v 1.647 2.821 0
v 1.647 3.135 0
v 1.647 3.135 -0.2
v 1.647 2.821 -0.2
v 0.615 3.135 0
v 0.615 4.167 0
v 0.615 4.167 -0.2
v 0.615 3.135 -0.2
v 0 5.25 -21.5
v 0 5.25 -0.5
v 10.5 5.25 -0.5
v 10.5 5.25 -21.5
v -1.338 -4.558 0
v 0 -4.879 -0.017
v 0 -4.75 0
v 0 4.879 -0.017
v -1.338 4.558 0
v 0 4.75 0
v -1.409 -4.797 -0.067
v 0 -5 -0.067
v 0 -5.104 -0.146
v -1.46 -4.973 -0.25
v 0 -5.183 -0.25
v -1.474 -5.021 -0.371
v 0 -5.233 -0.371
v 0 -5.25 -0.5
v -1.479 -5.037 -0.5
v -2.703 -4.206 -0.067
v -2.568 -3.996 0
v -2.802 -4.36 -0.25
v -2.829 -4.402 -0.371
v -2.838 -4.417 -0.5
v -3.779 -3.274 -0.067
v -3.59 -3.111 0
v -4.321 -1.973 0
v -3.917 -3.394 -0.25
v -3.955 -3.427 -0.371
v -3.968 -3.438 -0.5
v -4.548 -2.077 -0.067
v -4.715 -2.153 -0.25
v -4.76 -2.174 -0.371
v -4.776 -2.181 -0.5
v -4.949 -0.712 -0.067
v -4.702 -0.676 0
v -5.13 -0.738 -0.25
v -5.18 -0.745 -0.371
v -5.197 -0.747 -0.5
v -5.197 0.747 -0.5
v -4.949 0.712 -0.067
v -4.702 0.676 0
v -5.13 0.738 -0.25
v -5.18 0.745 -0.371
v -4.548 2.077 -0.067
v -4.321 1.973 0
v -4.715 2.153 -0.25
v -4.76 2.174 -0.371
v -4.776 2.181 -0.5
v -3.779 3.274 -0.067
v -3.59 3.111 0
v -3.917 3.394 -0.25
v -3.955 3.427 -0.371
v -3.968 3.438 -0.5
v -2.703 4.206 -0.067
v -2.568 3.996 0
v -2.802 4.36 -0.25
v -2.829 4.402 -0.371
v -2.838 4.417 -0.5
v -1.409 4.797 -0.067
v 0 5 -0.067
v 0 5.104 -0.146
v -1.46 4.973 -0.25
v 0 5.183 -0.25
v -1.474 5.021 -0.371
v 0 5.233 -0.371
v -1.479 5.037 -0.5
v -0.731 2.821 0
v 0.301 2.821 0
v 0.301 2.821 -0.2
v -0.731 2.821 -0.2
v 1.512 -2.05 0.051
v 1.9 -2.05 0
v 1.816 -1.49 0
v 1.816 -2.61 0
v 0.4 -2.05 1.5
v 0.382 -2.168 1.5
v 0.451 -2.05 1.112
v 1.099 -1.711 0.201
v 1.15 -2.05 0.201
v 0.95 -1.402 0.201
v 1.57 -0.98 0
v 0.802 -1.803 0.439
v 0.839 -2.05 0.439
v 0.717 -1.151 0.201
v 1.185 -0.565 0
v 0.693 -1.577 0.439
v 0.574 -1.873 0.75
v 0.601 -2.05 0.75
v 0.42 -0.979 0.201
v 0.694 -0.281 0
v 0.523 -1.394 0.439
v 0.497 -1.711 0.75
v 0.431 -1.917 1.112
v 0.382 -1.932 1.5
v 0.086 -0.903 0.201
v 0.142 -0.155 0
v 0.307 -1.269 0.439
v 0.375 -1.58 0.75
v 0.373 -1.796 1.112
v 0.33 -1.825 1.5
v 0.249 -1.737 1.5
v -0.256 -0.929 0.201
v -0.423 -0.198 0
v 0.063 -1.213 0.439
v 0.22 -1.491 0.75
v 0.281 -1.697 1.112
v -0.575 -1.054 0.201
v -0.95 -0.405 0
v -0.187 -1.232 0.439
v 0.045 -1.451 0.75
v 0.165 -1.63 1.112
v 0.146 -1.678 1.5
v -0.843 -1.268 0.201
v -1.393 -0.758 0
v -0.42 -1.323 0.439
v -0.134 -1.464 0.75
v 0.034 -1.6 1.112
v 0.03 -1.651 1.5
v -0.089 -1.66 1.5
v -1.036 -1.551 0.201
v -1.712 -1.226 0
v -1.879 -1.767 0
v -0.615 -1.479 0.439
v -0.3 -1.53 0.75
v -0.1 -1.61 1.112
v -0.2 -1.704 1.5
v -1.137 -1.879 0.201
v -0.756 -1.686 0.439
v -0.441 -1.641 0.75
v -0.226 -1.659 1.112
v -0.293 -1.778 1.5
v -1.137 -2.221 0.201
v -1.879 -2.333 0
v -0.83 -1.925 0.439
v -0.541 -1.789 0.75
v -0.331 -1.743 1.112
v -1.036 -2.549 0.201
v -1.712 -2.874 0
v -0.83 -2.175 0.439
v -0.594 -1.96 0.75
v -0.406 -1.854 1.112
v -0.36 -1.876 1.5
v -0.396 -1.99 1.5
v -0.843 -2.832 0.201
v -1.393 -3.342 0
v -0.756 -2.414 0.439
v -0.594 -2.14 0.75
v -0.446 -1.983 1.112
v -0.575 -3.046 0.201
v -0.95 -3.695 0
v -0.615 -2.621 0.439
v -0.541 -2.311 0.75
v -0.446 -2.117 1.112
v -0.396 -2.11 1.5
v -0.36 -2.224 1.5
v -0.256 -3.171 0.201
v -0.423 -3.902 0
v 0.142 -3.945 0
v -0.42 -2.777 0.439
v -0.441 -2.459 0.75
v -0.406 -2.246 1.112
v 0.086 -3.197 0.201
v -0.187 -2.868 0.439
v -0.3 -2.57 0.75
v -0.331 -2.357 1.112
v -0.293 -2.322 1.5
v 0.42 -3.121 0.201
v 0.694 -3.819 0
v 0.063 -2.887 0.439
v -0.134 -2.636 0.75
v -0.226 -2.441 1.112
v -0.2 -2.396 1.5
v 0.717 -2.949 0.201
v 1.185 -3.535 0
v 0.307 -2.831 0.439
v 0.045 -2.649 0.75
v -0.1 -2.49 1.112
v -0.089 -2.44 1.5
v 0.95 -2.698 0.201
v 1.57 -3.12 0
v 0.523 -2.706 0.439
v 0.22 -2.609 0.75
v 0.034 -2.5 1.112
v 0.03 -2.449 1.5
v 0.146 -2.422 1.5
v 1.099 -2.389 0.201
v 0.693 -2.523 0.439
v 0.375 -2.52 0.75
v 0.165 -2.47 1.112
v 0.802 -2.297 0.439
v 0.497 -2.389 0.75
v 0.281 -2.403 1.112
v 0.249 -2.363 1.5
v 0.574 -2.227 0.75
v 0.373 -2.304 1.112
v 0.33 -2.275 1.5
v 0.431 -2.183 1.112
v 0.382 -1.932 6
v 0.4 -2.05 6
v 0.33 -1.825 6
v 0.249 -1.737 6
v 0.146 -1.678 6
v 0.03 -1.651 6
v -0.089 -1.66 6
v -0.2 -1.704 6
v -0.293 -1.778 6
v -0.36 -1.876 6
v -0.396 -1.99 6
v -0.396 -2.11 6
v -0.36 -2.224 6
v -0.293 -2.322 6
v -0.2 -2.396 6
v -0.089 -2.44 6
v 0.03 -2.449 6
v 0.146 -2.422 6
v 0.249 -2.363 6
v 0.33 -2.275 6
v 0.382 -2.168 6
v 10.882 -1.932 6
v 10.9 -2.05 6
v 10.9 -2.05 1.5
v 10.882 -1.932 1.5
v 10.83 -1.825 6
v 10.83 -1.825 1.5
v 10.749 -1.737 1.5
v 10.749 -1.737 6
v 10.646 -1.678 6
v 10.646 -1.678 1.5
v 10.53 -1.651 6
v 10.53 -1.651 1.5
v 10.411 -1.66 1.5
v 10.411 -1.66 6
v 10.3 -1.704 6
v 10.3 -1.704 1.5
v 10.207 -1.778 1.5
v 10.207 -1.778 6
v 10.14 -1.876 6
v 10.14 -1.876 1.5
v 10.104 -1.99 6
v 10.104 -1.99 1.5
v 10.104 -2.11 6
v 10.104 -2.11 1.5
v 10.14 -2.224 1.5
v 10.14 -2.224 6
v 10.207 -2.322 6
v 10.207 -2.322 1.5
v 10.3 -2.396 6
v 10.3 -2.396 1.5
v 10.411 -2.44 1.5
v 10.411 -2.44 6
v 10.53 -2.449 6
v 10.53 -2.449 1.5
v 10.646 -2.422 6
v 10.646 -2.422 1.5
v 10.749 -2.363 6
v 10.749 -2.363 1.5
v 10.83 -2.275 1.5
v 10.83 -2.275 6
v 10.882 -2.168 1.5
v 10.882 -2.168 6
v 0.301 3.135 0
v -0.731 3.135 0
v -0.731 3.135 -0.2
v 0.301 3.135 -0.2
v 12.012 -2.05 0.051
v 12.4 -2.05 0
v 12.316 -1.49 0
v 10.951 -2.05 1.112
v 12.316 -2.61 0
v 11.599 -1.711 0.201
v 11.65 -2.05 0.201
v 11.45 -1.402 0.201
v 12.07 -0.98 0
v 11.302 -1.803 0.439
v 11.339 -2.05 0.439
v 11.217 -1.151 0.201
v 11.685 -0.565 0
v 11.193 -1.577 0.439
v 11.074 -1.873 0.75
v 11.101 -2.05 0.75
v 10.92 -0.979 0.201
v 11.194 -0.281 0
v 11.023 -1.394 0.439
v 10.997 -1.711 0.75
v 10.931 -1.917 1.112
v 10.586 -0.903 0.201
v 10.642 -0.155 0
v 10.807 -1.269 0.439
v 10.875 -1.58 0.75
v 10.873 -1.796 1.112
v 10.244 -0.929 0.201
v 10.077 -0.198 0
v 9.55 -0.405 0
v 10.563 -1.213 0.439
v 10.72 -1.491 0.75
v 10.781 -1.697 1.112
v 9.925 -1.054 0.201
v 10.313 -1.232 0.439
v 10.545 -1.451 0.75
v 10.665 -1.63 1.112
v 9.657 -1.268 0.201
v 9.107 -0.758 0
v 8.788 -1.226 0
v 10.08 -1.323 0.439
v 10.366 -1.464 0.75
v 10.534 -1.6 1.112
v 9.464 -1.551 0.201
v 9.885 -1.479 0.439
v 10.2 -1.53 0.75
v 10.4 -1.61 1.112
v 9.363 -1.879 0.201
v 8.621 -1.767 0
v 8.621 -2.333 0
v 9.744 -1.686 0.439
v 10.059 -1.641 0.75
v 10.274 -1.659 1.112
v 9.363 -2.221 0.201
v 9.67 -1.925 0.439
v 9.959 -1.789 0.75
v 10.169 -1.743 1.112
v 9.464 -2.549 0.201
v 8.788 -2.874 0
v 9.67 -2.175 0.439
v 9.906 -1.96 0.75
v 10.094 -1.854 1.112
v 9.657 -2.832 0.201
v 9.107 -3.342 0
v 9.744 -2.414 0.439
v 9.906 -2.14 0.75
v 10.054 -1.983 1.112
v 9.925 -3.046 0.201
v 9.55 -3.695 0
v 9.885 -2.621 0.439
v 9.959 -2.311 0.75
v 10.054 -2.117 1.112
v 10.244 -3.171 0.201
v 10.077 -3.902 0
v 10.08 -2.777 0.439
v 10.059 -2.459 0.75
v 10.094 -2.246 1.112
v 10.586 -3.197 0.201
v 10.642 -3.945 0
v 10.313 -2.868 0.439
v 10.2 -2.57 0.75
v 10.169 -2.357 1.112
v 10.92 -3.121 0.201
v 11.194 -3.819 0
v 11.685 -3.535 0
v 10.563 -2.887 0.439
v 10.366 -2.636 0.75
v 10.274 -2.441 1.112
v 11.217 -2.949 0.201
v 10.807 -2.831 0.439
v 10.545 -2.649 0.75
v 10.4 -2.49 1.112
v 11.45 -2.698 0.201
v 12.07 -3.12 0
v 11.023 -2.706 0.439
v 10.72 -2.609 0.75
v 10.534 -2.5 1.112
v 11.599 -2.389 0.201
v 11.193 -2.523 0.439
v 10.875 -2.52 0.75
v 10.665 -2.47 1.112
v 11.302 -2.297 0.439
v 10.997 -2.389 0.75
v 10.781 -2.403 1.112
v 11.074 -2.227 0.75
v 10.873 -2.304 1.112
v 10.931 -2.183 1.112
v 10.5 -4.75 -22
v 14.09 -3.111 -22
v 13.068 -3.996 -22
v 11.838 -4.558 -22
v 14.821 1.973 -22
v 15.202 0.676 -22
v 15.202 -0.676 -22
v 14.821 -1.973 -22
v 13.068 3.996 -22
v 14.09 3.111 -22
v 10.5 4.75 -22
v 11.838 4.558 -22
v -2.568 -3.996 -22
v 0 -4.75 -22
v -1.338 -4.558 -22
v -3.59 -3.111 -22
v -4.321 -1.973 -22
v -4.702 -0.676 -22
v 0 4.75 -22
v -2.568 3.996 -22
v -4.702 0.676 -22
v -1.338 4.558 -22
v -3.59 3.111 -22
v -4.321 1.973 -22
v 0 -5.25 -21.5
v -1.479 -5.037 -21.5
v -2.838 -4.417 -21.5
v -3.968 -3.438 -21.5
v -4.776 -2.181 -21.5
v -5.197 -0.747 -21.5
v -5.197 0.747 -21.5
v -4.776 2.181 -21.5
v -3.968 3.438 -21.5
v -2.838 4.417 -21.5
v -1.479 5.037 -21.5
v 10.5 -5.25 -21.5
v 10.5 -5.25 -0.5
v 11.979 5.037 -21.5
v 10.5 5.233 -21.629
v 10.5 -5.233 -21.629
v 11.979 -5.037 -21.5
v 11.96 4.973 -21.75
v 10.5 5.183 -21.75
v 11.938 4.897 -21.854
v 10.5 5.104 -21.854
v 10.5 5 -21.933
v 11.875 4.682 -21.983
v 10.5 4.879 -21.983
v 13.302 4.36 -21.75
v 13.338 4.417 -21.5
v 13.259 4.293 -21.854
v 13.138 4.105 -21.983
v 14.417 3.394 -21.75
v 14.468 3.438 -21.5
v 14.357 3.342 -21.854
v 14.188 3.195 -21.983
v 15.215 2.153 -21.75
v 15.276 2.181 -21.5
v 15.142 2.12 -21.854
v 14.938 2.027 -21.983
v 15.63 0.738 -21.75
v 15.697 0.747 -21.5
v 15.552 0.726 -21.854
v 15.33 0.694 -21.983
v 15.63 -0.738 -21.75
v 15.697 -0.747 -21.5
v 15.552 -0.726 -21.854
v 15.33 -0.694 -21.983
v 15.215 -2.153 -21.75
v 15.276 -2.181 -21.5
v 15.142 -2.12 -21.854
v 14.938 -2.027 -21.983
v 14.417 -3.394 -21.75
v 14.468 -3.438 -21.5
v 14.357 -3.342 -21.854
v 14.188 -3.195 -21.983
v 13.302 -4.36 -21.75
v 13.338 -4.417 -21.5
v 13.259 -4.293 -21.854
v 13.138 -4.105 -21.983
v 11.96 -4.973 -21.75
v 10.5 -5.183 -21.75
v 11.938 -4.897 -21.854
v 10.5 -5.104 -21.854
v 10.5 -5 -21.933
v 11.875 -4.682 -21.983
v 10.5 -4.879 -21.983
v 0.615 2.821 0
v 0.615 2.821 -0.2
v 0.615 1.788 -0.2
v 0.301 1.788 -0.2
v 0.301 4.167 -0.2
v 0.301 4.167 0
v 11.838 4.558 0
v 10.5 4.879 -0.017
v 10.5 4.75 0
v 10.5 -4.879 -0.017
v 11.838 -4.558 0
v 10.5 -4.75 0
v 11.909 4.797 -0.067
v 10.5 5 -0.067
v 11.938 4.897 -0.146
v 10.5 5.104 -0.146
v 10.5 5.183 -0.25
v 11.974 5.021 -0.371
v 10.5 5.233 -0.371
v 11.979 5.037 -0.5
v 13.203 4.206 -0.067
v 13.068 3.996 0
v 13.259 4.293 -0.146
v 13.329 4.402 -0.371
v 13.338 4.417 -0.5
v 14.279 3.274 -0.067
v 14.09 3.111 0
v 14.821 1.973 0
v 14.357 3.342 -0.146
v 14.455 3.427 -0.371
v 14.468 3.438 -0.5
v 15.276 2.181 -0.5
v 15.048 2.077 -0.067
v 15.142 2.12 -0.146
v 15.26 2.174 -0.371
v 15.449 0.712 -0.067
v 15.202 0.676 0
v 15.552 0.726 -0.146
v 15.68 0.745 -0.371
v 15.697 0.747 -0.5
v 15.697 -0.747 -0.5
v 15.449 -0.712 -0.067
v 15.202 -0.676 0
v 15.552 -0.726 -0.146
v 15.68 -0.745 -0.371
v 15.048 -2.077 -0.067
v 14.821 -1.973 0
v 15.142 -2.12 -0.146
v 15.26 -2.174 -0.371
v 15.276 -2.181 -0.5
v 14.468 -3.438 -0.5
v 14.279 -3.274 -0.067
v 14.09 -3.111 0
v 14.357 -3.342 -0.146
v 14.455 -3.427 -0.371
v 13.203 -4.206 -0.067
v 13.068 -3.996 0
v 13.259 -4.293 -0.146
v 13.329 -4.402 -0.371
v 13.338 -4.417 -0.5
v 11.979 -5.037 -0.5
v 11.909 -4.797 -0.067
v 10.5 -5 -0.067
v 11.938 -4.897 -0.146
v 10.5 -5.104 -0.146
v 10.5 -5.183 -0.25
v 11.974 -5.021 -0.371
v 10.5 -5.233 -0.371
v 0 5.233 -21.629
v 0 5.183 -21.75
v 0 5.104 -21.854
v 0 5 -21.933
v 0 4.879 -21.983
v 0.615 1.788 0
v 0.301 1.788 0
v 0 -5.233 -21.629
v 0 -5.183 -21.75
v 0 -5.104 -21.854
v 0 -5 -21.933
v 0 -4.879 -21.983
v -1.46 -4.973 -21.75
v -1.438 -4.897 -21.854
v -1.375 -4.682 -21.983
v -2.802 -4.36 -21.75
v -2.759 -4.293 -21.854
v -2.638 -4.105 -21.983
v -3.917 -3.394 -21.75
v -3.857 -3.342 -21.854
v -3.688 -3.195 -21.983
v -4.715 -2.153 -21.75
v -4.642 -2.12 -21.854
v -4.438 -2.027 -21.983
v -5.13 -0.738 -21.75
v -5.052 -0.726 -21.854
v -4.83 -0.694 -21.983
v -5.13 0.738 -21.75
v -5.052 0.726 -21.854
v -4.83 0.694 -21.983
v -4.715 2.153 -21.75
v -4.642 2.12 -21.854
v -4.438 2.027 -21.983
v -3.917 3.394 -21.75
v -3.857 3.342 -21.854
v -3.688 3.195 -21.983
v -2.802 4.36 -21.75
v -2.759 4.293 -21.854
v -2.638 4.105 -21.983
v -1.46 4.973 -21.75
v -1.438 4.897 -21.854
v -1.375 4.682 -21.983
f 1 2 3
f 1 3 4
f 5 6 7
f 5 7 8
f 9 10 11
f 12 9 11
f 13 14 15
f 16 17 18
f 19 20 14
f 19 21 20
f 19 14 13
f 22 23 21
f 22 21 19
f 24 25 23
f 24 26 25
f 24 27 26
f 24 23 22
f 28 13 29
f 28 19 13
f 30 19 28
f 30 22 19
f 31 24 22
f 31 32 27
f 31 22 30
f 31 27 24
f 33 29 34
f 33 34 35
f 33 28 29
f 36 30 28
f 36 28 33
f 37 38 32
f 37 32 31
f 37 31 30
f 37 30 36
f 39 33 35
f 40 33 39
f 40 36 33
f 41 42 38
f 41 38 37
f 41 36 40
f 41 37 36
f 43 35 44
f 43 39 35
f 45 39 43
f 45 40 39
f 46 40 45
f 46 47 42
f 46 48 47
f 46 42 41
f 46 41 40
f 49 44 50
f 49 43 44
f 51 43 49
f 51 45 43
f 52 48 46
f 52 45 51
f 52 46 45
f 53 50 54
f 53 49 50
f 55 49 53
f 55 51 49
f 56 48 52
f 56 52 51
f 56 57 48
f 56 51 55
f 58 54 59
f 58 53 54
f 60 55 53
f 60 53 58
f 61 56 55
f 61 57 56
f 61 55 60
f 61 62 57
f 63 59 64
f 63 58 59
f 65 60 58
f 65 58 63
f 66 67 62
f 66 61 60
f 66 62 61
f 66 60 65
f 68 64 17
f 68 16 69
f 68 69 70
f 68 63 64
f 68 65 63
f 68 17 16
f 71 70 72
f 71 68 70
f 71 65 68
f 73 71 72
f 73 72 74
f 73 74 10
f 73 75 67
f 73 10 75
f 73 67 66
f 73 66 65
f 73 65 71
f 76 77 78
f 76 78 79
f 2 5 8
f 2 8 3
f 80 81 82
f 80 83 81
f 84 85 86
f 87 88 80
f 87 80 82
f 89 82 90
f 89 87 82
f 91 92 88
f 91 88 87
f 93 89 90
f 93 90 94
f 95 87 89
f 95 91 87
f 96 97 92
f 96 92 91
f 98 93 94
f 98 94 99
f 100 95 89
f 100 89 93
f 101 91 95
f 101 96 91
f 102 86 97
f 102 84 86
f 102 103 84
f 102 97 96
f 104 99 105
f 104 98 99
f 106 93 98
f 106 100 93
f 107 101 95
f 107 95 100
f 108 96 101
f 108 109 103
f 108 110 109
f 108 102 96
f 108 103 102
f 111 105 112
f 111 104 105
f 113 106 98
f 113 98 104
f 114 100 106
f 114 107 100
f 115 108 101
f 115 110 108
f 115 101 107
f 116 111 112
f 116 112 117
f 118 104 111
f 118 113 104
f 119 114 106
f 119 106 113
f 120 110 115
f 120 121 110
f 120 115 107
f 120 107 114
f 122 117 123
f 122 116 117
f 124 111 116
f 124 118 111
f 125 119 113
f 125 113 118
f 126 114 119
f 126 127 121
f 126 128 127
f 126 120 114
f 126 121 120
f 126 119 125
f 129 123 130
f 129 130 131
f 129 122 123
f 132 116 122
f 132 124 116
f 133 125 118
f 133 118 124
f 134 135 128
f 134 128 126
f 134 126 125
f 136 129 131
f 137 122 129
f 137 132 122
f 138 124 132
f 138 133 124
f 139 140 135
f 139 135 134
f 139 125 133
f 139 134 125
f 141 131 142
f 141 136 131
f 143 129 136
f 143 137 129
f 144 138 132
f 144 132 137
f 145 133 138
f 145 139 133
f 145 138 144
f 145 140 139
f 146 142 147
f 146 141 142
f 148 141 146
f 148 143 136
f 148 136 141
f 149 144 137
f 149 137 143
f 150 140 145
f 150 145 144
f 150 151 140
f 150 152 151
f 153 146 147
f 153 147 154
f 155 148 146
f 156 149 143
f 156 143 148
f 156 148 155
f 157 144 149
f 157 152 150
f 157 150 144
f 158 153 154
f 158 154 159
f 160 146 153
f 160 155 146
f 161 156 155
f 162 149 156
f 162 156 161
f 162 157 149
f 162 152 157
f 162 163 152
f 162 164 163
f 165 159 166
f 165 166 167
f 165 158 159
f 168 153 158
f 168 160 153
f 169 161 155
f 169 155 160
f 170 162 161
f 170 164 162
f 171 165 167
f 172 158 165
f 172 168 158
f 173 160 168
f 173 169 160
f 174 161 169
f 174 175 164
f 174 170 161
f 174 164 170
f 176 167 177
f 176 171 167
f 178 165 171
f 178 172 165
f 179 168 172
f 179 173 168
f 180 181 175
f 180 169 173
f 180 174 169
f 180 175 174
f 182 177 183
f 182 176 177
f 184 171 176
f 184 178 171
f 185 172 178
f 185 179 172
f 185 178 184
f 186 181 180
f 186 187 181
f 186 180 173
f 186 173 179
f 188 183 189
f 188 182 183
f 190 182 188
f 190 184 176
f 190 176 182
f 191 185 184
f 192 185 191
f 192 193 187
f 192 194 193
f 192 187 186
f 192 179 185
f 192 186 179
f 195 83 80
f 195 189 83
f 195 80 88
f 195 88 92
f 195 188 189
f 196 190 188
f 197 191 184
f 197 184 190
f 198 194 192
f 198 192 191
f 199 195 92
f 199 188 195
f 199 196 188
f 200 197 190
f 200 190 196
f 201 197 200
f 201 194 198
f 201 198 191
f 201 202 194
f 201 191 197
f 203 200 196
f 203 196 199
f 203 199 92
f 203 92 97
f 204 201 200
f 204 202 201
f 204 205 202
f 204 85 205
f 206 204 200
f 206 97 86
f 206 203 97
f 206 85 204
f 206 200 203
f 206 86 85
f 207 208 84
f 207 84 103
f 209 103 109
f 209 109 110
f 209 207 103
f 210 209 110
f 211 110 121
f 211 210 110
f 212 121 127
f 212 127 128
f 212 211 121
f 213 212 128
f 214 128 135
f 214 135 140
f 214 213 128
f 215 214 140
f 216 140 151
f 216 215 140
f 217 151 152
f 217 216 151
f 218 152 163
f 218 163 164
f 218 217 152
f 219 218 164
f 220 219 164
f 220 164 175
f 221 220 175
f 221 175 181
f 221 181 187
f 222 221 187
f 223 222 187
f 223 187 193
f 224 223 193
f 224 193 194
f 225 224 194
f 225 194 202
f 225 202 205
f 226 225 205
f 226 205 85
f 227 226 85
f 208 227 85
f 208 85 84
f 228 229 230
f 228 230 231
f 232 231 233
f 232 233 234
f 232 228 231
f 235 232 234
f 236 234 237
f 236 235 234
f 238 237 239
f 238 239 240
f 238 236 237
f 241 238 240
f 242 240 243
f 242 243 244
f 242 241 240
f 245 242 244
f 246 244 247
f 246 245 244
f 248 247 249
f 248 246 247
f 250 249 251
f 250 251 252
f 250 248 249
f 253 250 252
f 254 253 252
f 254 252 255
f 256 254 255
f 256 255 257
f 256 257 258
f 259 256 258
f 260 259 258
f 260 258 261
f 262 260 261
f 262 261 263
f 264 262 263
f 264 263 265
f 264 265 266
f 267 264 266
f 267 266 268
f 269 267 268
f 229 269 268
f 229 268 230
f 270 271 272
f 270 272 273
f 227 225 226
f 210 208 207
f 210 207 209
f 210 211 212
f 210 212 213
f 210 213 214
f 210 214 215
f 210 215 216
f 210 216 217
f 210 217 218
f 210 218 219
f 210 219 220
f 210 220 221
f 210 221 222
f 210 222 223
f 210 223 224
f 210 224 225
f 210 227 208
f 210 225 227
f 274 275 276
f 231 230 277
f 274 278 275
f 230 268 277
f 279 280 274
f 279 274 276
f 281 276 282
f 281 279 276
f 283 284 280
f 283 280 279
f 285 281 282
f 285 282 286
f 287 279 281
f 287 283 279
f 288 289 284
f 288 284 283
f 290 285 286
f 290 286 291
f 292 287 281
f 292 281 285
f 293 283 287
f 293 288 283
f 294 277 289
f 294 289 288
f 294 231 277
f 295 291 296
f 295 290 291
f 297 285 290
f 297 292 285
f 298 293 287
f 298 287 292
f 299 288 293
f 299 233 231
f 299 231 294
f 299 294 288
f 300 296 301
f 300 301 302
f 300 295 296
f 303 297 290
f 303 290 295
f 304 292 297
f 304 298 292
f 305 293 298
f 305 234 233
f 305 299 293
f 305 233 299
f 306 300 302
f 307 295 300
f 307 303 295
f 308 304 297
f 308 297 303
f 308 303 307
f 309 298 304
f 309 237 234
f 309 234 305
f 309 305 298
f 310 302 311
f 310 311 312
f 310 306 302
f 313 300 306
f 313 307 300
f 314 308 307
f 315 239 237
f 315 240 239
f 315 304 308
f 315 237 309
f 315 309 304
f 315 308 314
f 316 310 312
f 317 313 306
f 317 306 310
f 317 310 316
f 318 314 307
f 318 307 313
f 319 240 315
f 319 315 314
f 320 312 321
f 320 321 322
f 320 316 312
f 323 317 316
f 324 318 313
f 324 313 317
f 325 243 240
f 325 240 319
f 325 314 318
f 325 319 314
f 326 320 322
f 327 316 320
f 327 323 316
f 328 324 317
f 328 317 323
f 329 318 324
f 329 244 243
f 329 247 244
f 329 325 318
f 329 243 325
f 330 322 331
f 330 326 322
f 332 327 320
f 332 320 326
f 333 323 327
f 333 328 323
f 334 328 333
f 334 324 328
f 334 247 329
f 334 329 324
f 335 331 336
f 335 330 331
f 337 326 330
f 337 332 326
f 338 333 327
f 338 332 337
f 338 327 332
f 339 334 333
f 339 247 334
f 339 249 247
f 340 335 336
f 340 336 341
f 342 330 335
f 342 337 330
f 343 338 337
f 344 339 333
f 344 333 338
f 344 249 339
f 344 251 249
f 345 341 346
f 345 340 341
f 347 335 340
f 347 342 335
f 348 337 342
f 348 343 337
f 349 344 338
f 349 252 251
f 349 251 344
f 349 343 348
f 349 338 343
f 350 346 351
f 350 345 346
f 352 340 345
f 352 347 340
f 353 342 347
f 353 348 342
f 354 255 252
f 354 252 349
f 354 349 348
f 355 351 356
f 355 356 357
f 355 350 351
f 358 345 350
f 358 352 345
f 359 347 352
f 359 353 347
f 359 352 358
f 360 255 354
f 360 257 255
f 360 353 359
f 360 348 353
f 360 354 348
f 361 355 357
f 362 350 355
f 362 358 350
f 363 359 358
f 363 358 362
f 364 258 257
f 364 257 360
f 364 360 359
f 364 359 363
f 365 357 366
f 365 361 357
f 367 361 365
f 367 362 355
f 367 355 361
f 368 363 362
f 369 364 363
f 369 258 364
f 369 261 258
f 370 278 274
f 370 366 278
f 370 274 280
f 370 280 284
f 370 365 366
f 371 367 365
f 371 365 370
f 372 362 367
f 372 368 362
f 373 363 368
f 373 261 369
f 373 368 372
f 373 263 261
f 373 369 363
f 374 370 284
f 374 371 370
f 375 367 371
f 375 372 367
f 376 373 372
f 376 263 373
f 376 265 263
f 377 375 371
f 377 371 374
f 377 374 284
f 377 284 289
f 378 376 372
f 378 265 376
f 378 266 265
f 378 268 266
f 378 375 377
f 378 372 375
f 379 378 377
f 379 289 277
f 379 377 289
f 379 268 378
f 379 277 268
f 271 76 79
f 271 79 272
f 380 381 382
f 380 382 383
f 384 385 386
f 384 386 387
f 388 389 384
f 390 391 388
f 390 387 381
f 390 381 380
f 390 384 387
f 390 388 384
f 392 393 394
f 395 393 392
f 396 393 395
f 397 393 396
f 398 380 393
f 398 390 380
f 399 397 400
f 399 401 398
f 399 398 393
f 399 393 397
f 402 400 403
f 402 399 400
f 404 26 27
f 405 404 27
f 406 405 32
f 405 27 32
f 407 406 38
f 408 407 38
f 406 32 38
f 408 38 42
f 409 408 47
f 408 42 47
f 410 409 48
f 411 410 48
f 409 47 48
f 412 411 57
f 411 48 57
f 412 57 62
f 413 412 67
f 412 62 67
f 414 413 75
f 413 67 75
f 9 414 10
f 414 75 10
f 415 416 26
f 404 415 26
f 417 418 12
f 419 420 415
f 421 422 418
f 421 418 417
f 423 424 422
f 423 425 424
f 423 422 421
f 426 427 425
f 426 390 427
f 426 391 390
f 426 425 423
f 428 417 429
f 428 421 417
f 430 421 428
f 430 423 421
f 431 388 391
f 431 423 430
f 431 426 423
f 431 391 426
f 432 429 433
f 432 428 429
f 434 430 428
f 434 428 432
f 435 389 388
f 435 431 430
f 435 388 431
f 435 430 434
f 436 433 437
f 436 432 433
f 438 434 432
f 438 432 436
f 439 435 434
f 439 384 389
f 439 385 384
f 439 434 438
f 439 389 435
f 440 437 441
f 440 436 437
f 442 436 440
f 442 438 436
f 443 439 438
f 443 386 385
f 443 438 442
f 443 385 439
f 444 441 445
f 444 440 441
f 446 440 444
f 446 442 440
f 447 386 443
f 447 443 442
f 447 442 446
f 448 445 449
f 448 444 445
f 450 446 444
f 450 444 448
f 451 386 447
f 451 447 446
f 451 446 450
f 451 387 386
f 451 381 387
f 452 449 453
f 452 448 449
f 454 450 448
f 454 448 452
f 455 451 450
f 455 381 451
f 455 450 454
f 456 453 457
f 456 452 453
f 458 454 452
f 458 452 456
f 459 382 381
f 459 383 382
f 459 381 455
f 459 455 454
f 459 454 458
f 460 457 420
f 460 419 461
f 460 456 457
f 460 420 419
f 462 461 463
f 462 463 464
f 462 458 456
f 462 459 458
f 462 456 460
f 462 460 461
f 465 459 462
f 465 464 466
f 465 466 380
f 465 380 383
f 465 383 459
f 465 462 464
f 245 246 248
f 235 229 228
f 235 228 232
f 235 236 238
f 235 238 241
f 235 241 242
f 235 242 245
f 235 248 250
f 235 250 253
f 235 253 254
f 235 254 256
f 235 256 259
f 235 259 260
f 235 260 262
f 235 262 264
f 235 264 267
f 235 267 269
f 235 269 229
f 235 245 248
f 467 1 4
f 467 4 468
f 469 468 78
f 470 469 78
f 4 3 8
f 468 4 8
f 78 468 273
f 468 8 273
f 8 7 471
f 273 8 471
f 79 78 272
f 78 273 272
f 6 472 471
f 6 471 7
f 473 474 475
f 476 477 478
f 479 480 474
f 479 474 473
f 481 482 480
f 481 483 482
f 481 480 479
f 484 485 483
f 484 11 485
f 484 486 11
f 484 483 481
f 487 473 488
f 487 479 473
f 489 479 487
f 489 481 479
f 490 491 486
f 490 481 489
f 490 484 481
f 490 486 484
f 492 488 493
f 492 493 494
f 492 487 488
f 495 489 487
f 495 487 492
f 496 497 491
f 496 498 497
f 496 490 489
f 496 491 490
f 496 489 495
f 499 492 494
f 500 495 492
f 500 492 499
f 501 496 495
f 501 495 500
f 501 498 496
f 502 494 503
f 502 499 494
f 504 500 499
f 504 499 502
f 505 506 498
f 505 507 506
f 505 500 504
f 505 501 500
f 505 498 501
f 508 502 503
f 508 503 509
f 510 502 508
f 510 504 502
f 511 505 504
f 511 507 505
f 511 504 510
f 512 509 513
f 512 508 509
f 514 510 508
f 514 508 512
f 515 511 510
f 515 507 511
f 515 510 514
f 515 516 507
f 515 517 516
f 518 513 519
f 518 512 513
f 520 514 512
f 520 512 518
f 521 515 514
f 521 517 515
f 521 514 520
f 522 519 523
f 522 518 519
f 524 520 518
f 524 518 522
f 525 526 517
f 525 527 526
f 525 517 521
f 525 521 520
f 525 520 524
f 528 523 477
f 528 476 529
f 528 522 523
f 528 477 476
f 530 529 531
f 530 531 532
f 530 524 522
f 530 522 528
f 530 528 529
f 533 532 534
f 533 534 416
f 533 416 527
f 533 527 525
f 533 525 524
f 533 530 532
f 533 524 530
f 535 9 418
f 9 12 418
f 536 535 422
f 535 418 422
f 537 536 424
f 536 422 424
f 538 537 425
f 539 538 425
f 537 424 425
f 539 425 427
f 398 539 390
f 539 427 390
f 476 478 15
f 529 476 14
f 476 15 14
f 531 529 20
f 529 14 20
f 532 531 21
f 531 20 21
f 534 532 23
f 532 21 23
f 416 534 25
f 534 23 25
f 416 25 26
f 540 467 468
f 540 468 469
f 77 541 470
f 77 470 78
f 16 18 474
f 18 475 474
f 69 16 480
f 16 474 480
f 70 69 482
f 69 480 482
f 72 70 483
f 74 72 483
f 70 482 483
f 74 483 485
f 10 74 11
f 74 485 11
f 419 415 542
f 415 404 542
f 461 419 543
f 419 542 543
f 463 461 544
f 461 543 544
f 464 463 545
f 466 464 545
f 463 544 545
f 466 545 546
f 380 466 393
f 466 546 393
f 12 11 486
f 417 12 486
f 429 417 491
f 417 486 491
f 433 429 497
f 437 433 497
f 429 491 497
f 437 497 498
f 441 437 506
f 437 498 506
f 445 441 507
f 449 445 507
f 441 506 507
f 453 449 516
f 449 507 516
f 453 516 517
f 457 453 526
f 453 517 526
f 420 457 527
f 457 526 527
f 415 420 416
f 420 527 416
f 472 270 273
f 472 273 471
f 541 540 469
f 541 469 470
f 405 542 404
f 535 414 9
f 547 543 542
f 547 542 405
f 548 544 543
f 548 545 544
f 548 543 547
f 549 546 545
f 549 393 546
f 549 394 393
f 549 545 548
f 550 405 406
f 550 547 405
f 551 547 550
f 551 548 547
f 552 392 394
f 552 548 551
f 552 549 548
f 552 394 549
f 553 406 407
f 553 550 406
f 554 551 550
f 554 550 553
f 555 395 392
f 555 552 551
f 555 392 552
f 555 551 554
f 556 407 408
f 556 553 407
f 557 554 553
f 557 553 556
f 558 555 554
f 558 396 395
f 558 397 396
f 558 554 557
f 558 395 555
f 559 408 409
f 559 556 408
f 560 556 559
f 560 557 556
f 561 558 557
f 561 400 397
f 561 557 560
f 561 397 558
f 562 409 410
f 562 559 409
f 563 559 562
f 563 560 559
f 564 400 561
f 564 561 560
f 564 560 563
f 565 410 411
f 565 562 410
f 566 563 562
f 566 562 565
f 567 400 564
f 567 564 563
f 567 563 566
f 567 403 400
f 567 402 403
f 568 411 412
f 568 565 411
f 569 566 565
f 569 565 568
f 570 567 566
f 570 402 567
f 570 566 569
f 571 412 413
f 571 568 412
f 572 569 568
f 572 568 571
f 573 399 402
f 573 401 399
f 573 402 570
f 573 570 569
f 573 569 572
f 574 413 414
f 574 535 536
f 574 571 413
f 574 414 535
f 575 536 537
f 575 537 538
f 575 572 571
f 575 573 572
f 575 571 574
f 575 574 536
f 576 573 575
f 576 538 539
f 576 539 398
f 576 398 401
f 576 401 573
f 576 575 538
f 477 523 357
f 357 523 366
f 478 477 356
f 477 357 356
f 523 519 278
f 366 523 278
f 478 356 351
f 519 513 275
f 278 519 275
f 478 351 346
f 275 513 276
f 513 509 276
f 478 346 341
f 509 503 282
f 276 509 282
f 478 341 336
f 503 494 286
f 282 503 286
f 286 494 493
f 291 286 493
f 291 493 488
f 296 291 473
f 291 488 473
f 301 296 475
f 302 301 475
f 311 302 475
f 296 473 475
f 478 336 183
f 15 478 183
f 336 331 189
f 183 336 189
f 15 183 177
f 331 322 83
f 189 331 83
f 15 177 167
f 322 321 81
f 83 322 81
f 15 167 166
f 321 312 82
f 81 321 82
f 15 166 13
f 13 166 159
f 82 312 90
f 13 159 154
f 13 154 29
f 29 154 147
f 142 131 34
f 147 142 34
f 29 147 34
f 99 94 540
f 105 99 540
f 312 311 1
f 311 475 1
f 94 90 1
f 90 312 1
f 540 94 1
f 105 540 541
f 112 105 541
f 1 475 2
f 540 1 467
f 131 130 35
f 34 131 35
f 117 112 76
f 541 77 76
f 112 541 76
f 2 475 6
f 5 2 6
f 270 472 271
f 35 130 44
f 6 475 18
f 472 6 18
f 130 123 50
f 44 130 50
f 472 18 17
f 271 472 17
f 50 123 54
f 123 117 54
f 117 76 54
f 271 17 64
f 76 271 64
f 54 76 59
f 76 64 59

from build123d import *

# Parameters (mm, degrees)
BOSS_EXTRUDE1_DEPTH = 22
SKETCH2_R           = 0.4
FILLET1_R           = 1.5
FILLET2_R           = 0.5
CUT_EXTRUDE1_DEPTH  = 0.2


with BuildPart() as part:
    # Sketch1 → Boss-Extrude1 (new body)
    with BuildSketch(Plane.XY):
        with BuildLine():
            Line((0, 5.25), (10.5, 5.25))
            ThreePointArc((10.5, 5.25), (15.75, 0), (10.5, -5.25))
            Line((10.5, -5.25), (0, -5.25))
            ThreePointArc((0, -5.25), (-5.25, 0), (0, 5.25))
        make_face()
    extrude(amount=-BOSS_EXTRUDE1_DEPTH)

    # Sweep1: sweep along a path in Sketch3
    with BuildLine(Plane.YZ) as sweep1_path:
        Line((-2.05, 0), (-2.05, 6))
    # Sketch2 → Sweep1 (sweep)
    with BuildSketch(Plane.XY):
        with Locations((0, -2.05)):
            Circle(SKETCH2_R)
        with Locations((10.5, -2.05)):
            Circle(SKETCH2_R)
    sweep(path=sweep1_path.line)

    # Fillet1
    fillet1_edges = [part.edges().sort_by_distance(p)[0] for p in [
        (-0.4, -2.05, 0),
        (10.1, -2.05, 0),
    ]]
    fillet(fillet1_edges, radius=FILLET1_R)

    # Fillet2
    fillet2_edges = [part.edges().sort_by_distance(p)[0] for p in [
        (15.75, 0, -22),
        (5.25, 5.25, -22),
        (-5.25, 0, -22),
        (5.25, 5.25, 0),
        (15.75, 0, 0),
        (5.25, -5.25, 0),
        (-5.25, 0, 0),
        (5.25, -5.25, -22),
    ]]
    fillet(fillet2_edges, radius=FILLET2_R)

    # Sketch4 → Cut-Extrude1 (cut)
    with BuildSketch(Plane.XY):
        Polygon((0.301282051, 3.134615385), (0.301282051, 4.166666667), (0.615384615, 4.166666667), (0.615384615, 3.134615385), (1.647435897, 3.134615385), (1.647435897, 2.820512821), (0.615384615, 2.820512821), (0.615384615, 1.788461538), (0.301282051, 1.788461538), (0.301282051, 2.820512821), (-0.730769231, 2.820512821), (-0.730769231, 3.134615385), align=None)
    extrude(amount=-CUT_EXTRUDE1_DEPTH, mode=Mode.SUBTRACT)


solid = part.part
